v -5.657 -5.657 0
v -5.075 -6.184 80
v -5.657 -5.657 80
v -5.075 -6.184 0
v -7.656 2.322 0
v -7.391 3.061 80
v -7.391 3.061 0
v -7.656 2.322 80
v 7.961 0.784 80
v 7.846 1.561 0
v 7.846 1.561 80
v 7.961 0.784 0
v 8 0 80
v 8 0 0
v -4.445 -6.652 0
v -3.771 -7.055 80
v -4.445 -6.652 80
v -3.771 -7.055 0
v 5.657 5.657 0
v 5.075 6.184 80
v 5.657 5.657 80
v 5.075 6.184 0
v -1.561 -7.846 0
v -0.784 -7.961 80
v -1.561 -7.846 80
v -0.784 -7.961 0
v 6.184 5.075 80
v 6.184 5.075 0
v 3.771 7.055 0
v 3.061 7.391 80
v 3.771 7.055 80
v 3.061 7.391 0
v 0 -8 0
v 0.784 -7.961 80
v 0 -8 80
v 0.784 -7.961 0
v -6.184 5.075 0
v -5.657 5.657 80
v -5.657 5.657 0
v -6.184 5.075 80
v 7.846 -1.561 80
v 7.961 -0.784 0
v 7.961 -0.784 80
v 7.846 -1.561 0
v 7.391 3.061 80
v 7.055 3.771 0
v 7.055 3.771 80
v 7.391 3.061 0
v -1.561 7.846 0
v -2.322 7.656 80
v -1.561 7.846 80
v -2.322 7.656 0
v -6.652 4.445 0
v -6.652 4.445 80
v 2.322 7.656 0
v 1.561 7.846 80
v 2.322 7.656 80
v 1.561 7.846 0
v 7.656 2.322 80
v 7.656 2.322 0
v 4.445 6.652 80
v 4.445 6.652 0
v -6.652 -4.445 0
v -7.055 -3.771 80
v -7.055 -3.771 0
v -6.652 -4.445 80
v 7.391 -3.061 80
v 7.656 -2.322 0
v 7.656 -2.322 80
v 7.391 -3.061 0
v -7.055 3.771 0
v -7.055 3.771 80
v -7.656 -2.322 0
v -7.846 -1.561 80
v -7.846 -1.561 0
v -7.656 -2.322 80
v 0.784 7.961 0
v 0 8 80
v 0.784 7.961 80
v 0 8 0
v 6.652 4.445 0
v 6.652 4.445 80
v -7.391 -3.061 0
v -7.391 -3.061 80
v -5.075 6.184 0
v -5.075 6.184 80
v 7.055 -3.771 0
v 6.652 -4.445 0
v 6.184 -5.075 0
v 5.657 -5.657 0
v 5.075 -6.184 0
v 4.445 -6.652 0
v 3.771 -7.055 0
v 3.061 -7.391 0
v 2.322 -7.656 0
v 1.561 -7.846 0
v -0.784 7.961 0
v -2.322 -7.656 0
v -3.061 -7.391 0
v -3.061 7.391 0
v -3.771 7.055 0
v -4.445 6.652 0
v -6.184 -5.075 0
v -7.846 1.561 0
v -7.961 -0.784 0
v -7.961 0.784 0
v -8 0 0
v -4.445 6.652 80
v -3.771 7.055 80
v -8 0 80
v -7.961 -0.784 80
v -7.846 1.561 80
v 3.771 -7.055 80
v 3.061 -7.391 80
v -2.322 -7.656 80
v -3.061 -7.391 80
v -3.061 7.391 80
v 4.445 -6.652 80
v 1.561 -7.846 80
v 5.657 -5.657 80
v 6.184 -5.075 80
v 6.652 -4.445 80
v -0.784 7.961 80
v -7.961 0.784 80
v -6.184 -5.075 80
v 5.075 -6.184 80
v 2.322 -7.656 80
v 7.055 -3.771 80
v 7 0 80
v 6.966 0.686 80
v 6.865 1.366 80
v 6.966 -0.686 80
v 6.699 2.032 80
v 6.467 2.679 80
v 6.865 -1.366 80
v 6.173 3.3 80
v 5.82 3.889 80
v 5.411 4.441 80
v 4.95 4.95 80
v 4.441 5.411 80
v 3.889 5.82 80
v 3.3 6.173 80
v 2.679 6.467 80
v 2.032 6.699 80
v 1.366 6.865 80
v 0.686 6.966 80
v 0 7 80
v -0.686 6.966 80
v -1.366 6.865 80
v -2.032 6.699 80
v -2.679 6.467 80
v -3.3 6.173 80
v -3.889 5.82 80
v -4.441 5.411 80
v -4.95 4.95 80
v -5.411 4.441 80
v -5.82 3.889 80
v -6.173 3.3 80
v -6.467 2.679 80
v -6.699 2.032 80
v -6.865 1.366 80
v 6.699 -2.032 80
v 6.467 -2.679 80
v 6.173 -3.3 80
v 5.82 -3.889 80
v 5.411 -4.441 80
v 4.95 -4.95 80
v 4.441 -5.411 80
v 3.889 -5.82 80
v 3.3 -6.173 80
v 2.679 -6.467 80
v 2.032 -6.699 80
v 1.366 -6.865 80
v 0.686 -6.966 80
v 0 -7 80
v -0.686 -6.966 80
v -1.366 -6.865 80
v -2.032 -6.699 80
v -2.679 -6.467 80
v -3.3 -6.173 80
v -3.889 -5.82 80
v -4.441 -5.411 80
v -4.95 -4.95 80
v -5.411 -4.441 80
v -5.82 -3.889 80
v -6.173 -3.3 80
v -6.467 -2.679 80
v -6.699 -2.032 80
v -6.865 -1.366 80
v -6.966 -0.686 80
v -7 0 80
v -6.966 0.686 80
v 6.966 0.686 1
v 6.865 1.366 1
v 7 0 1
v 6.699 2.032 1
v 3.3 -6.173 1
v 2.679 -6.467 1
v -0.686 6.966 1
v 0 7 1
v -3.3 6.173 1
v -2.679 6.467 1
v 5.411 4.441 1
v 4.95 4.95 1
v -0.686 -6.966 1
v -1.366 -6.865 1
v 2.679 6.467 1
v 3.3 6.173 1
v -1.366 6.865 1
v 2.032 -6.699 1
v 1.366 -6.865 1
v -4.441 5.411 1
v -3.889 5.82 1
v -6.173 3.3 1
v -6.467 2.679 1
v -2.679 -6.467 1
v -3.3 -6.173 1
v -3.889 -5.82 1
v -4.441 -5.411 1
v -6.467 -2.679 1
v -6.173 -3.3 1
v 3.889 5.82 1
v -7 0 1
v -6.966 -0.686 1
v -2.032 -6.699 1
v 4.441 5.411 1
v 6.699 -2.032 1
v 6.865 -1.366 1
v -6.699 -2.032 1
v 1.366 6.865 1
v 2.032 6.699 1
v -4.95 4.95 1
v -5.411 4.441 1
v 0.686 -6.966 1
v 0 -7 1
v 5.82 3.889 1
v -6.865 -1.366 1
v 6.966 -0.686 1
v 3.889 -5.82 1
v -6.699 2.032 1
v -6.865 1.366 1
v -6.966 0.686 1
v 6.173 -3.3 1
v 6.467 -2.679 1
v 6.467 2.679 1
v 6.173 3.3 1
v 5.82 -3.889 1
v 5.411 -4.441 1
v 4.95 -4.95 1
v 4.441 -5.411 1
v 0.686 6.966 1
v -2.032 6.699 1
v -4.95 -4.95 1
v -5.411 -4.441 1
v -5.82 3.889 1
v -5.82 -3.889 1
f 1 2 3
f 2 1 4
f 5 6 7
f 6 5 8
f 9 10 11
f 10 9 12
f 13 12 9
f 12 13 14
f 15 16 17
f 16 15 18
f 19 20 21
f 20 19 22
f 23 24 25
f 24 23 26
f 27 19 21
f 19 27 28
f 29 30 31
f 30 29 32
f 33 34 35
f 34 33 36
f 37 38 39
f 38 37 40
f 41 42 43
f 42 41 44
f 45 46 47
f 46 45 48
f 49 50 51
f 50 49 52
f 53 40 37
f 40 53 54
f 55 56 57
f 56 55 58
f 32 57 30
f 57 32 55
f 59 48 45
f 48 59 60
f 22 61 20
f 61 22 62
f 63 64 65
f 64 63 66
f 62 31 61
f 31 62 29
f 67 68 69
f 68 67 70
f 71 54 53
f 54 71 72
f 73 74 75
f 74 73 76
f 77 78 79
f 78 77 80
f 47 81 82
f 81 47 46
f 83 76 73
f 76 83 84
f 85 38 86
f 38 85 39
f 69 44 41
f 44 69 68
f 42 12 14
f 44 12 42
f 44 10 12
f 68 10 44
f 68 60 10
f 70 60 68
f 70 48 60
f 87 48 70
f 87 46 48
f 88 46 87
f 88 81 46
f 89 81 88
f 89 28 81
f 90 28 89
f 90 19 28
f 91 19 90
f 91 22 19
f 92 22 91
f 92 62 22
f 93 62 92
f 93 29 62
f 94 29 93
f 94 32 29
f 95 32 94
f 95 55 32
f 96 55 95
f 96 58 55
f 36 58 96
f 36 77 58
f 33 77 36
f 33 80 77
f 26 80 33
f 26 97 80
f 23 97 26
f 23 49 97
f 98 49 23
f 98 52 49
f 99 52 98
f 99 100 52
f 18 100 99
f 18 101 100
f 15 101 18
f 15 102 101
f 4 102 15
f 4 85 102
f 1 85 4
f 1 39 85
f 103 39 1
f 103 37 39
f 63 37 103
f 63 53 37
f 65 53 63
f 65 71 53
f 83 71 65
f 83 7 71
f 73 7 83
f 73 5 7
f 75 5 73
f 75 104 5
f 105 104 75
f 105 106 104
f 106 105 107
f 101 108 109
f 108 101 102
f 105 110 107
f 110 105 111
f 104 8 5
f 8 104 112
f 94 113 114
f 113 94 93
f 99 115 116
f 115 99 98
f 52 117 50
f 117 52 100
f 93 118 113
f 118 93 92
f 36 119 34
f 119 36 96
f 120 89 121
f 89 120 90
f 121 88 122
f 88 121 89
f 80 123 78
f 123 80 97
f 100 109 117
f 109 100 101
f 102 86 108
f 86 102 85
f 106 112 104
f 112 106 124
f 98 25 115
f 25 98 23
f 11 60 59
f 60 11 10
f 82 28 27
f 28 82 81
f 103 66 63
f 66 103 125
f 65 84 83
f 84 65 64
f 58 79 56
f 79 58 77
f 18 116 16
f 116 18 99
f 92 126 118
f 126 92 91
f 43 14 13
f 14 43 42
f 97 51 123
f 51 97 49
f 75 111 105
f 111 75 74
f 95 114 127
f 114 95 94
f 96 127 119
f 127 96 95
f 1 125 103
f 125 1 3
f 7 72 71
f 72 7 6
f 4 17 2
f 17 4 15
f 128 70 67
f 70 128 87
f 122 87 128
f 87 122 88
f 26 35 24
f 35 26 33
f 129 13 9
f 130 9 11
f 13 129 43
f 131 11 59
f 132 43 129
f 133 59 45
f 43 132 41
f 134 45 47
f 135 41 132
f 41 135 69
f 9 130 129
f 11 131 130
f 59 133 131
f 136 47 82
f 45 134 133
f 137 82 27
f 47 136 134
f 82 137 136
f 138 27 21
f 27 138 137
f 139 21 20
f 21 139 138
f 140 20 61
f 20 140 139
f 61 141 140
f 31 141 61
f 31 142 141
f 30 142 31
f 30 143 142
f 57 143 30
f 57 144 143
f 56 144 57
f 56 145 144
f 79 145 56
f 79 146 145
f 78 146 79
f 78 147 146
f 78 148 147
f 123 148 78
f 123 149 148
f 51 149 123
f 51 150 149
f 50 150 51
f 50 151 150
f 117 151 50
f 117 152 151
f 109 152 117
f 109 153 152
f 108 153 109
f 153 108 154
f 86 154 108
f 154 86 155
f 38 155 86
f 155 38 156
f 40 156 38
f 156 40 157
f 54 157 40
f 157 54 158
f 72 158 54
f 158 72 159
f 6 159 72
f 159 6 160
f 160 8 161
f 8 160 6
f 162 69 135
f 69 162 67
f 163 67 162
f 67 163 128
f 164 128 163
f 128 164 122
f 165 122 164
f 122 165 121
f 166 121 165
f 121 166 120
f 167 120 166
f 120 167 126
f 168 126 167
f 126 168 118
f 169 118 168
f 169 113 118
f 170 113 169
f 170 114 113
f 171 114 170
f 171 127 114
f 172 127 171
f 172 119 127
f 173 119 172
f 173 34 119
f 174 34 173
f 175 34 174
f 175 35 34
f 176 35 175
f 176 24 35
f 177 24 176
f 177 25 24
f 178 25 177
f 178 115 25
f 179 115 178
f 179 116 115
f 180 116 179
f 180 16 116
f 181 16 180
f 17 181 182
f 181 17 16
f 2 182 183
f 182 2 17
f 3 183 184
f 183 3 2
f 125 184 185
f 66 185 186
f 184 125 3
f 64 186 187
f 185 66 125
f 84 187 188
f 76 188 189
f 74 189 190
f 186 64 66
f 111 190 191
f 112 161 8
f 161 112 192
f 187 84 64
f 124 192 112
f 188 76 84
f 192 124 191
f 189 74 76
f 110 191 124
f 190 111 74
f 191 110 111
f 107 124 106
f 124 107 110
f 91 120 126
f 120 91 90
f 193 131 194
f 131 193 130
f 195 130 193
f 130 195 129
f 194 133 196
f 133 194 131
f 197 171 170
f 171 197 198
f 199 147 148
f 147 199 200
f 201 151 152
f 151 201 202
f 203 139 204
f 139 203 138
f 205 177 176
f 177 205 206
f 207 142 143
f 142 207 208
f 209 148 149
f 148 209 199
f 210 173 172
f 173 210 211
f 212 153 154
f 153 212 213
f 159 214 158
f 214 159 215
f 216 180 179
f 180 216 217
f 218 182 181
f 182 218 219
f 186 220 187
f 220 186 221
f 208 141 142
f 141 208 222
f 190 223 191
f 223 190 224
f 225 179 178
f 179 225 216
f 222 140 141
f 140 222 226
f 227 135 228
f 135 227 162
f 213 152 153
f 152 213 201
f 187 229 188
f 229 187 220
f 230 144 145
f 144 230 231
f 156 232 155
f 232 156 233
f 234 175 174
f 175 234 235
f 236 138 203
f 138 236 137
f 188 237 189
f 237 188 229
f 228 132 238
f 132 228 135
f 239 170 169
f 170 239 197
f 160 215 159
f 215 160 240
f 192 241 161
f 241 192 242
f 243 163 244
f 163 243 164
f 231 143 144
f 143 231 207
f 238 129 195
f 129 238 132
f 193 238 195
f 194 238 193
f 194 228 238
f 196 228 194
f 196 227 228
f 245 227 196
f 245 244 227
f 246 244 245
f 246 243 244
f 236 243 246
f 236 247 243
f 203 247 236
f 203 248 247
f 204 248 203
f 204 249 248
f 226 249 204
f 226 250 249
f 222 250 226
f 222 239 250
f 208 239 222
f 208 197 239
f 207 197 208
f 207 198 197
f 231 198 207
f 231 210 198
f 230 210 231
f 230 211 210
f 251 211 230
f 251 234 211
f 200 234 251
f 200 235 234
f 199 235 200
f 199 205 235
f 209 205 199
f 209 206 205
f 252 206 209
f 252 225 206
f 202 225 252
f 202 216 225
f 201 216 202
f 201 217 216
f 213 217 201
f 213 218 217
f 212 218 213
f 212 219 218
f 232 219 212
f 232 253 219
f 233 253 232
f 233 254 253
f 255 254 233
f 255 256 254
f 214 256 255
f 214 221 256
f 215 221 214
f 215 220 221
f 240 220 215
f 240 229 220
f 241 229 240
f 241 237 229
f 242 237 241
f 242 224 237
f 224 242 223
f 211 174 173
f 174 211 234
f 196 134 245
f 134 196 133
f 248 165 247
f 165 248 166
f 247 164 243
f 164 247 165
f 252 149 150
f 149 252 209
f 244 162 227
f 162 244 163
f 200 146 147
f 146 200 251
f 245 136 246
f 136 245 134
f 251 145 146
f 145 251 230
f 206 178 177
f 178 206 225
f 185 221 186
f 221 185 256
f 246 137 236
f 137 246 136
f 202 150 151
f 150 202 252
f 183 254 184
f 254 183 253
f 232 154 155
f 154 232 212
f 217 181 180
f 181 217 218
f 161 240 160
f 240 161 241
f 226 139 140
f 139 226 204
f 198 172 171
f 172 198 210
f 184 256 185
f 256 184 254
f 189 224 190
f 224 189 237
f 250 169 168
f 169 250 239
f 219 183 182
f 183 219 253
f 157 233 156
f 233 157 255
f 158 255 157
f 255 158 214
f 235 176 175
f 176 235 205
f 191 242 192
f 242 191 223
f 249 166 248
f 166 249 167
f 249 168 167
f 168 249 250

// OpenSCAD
$fn = 64;
wall = 1;


difference() {
    cylinder( r=8, h=80 );

    translate( [ 0, 0, wall ] )
    cylinder( r=8-wall, h=80 );
};
